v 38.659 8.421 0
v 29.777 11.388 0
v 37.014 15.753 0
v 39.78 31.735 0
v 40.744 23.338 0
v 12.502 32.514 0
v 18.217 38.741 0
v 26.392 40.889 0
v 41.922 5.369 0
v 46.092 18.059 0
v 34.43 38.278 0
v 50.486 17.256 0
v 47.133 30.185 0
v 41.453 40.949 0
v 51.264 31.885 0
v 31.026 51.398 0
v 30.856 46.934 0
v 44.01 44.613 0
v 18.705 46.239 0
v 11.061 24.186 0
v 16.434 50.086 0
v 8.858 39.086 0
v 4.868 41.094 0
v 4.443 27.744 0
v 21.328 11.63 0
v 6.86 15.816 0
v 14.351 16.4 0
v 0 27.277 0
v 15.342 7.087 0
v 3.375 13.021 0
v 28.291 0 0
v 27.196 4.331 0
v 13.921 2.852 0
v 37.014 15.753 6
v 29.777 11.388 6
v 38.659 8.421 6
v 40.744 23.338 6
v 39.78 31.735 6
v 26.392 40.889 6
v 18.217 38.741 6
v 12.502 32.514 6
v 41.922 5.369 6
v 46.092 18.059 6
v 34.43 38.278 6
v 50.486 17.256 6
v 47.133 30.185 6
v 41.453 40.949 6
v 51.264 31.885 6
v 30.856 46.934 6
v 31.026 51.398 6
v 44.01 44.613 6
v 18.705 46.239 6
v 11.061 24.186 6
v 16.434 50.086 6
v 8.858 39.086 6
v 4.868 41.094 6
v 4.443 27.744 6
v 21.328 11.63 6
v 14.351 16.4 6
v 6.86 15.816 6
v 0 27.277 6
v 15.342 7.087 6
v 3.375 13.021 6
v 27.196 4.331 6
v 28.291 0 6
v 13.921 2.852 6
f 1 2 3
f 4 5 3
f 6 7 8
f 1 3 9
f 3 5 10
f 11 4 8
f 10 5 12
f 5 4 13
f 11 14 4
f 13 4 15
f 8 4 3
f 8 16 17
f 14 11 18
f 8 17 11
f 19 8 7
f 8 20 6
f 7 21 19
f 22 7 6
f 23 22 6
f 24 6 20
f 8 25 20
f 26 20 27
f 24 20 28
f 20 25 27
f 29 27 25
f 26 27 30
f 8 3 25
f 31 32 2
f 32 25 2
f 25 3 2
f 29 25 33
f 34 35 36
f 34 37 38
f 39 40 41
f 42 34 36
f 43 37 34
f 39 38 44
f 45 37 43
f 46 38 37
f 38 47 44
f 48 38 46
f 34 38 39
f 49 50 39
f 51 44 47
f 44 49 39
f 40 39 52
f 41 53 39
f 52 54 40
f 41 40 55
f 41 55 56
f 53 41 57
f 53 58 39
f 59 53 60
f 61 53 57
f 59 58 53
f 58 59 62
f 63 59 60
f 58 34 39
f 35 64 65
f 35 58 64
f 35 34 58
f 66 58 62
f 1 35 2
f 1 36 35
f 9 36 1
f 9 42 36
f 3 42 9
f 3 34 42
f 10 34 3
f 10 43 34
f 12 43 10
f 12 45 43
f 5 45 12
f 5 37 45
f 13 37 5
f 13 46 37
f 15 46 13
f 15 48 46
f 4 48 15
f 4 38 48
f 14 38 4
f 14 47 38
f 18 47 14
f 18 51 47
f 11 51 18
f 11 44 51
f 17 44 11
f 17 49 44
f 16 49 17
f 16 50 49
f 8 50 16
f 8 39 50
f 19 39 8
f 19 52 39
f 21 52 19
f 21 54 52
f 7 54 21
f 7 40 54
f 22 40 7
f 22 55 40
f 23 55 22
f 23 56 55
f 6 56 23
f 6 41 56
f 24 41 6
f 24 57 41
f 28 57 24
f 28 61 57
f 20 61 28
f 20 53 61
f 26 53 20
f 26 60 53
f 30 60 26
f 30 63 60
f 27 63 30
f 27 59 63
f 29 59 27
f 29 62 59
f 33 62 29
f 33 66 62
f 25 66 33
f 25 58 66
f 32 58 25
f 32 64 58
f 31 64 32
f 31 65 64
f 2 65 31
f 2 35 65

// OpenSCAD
$fn = 32;

// ----------------------------------------------------------------------
// Fan rotor section: 11 blades, 15 mm hub radius, 11 mm blades
// ----------------------------------------------------------------------

// --- parameters (mm) ---
profile_height = 6;       // extrusion height
profile_points = 33;      // points of the closed outline

profile = [[40.744, 23.338], [47.133, 30.185], [51.264, 31.885], [39.78, 31.735], [41.453, 40.949], [44.01, 44.613], [34.43, 38.278], [30.856, 46.934], [31.026, 51.398], [26.392, 40.889], [18.705, 46.239], [16.434, 50.086], [18.217, 38.741], [8.858, 39.086], [4.868, 41.094], [12.502, 32.514], [4.443, 27.744], [0, 27.277], [11.061, 24.186], [6.86, 15.816], [3.375, 13.021], [14.351, 16.4], [15.342, 7.087], [13.921, 2.852], [21.328, 11.63], [27.196, 4.331], [28.291, 0], [29.777, 11.388], [38.659, 8.421], [41.922, 5.369], [37.014, 15.753], [46.092, 18.059], [50.486, 17.256]];  // single closed polygon, 33 points, counter clockwise

// --- the one profile operation ---
linear_extrude(height = profile_height) polygon(points = profile);
